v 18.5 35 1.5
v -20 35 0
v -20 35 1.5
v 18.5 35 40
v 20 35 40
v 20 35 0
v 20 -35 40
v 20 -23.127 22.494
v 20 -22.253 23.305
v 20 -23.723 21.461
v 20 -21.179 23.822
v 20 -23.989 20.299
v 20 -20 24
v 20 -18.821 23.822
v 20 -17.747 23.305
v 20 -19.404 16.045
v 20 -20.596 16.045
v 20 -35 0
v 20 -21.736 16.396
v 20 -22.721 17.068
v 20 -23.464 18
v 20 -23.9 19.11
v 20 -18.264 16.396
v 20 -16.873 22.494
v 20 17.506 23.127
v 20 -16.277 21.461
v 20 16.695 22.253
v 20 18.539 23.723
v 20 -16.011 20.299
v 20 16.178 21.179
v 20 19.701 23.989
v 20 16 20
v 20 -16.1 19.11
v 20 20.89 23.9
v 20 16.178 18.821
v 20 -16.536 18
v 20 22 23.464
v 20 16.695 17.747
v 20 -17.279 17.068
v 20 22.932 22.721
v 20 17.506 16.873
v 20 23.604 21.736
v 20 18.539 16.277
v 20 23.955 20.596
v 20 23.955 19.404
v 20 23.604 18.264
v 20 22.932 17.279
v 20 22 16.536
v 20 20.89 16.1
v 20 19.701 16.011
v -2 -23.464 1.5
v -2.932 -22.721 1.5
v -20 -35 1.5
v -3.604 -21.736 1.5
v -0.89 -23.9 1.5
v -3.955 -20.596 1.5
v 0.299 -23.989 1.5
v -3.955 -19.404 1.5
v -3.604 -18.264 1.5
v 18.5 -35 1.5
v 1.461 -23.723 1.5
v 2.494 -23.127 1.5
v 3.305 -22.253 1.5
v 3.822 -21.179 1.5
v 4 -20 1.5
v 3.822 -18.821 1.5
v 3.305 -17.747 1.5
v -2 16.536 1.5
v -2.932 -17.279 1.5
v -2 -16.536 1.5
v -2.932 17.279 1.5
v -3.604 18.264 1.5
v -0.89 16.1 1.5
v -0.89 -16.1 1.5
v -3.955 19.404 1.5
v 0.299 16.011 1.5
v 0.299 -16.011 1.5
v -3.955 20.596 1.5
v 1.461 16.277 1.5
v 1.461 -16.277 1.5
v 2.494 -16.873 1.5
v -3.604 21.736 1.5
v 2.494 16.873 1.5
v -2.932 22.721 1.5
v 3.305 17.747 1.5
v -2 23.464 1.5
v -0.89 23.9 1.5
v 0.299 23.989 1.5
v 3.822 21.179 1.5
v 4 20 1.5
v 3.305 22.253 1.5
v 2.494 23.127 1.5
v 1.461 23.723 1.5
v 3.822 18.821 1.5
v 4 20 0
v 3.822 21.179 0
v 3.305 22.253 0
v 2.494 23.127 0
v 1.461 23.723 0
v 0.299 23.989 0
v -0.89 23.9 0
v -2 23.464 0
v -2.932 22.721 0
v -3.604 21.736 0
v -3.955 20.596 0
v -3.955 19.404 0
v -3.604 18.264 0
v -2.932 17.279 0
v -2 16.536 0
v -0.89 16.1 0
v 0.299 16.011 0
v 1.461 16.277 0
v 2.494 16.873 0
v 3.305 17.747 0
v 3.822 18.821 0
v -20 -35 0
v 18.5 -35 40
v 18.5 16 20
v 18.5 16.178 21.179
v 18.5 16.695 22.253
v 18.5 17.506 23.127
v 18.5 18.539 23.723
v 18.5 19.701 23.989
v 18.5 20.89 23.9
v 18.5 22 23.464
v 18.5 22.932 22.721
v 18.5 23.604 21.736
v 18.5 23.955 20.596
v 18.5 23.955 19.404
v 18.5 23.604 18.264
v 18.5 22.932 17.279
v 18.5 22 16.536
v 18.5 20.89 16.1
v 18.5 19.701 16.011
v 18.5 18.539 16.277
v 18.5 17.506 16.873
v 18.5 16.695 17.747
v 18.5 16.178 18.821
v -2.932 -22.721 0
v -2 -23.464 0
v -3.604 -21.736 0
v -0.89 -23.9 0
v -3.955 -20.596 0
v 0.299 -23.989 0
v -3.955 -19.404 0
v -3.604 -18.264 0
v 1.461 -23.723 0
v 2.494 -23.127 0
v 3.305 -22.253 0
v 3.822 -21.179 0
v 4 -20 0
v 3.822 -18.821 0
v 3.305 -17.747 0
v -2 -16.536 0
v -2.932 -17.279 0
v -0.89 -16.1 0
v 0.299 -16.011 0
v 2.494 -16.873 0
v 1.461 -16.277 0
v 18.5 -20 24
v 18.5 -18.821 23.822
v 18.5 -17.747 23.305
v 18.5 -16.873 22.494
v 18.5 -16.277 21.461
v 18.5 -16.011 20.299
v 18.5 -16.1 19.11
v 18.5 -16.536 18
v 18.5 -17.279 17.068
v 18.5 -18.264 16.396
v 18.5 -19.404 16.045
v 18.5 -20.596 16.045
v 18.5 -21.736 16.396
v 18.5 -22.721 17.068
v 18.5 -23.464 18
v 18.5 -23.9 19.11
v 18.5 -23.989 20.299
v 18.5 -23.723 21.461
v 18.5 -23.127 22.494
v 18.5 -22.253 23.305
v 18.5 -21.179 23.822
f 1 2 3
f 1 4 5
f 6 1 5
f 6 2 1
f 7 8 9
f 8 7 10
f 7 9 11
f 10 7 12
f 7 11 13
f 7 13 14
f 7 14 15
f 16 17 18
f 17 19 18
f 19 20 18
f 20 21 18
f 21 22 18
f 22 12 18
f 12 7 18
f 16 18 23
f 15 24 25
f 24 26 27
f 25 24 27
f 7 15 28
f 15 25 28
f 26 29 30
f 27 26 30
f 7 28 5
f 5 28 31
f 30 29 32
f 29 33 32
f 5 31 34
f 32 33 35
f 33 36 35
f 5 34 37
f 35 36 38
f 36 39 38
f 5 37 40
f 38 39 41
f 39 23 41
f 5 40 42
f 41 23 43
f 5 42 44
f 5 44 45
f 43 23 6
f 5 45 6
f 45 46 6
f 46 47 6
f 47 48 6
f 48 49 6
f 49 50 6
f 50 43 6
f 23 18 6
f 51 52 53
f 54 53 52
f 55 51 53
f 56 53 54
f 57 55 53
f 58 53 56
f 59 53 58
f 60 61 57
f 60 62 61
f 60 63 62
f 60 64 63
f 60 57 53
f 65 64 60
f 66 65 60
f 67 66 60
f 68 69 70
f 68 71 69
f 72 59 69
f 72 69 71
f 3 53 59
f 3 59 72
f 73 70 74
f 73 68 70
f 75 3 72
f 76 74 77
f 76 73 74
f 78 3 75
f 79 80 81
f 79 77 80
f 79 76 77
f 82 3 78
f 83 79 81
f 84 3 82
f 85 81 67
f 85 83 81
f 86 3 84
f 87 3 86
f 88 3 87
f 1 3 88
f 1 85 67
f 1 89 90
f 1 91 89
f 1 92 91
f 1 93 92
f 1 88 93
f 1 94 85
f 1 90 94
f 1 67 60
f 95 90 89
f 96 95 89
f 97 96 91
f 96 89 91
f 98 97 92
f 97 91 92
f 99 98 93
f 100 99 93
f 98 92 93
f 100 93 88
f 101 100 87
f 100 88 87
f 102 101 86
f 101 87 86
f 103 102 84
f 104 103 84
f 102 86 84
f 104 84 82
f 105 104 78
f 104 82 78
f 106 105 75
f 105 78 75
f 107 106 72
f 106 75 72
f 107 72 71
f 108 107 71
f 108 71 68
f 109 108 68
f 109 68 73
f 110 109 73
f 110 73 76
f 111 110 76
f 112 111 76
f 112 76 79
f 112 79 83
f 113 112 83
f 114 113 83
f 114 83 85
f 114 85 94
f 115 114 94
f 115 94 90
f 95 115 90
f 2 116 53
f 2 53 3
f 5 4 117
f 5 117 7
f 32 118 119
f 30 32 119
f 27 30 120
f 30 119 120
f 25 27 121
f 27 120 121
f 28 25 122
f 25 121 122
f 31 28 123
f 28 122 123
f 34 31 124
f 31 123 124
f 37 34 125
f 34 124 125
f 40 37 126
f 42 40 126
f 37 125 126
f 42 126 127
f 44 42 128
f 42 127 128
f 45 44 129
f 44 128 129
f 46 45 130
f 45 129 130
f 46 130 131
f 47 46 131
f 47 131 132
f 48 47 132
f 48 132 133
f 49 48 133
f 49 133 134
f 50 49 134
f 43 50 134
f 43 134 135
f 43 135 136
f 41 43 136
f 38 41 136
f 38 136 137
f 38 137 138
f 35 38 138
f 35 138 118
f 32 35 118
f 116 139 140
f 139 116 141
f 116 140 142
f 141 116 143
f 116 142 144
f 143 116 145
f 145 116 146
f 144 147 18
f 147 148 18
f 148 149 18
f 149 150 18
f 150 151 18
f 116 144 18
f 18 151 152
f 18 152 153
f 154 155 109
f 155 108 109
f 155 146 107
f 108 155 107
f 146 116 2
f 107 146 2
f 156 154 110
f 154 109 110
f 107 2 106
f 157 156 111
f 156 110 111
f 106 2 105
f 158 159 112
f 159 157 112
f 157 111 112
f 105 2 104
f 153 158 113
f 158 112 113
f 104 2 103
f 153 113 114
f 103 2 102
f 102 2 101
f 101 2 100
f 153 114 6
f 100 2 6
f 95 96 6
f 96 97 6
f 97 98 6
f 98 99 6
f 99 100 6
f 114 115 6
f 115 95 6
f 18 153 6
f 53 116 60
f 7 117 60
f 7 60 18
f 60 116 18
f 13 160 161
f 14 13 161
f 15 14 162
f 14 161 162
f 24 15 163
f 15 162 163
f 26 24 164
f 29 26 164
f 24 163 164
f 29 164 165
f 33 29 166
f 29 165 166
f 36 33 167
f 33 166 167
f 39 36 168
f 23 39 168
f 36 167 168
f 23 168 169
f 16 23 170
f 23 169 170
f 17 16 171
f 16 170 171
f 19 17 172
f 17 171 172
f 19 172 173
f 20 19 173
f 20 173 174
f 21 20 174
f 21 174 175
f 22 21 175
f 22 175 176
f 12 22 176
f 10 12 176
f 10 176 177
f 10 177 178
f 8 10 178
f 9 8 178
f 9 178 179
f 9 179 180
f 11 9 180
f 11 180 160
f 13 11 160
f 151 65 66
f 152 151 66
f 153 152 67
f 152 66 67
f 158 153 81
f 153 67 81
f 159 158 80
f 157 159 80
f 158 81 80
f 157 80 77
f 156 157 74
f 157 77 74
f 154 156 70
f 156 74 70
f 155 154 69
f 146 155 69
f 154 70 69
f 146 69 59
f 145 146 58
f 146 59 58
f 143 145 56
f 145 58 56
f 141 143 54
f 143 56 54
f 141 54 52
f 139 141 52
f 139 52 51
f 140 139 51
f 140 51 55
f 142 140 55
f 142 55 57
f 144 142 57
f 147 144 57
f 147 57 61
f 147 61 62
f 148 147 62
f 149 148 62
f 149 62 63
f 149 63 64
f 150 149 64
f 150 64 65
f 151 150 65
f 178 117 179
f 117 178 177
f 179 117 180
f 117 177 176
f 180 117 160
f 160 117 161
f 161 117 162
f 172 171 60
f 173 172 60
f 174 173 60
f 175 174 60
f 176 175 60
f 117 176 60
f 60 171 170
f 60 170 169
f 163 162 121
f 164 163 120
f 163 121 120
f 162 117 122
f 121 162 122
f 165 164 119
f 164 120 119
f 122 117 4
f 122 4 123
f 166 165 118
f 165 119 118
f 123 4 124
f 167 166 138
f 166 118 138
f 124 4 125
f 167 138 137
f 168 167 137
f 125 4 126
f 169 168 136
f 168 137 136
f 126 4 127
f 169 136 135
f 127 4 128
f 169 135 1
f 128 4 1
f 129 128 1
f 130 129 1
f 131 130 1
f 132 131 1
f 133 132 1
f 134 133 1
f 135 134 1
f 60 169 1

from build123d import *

# Parameters (mm, degrees)
SZKIC1_W                    = 40
SZKIC1_H                    = 70
DODANIE_WYCI_GNI_CIE1_DEPTH = 40
SZKIC2_W                    = 38.5
SZKIC2_H                    = 38.5
WYTNIJ_WYCI_GNI_CIE1_DEPTH  = 80
SZKIC3_R                    = 4
WYTNIJ_WYCI_GNI_CIE2_DEPTH  = 80
SZKIC11_R                   = 4
WYTNIJ_WYCI_GNI_CIE3_DEPTH  = 40


with BuildPart() as part:
    # Szkic1 → Dodanie-wyciągnięcie1 (new body)
    with BuildSketch(Plane.XY):
        Rectangle(SZKIC1_W, SZKIC1_H)
    extrude(amount=DODANIE_WYCI_GNI_CIE1_DEPTH)

    # Szkic2 → Wytnij-wyciągnięcie1 (cut)
    with BuildSketch(Plane(origin=(0, 35, 0), x_dir=(1, 0, 0), z_dir=(0, 1, 0))):
        with Locations((-0.75, -20.75)):
            Rectangle(SZKIC2_W, SZKIC2_H)
    extrude(amount=-WYTNIJ_WYCI_GNI_CIE1_DEPTH, mode=Mode.SUBTRACT)

    # Szkic3 → Wytnij-wyciągnięcie2 (cut)
    with BuildSketch(Plane.ZY.offset(-18.5)):
        with Locations(Location((20, 20, 0), (0, 0, 270))):
            Circle(SZKIC3_R)
        with Locations((20, -20)):
            Circle(SZKIC3_R)
    extrude(amount=-WYTNIJ_WYCI_GNI_CIE2_DEPTH, mode=Mode.SUBTRACT)

    # Szkic11 → Wytnij-wyciągnięcie3 (cut)
    with BuildSketch(Plane.XY.offset(1.5)):
        with Locations((0, 20)):
            Circle(SZKIC11_R)
        with Locations((0, -20)):
            Circle(SZKIC11_R)
    extrude(amount=-WYTNIJ_WYCI_GNI_CIE3_DEPTH, mode=Mode.SUBTRACT)


solid = part.part
